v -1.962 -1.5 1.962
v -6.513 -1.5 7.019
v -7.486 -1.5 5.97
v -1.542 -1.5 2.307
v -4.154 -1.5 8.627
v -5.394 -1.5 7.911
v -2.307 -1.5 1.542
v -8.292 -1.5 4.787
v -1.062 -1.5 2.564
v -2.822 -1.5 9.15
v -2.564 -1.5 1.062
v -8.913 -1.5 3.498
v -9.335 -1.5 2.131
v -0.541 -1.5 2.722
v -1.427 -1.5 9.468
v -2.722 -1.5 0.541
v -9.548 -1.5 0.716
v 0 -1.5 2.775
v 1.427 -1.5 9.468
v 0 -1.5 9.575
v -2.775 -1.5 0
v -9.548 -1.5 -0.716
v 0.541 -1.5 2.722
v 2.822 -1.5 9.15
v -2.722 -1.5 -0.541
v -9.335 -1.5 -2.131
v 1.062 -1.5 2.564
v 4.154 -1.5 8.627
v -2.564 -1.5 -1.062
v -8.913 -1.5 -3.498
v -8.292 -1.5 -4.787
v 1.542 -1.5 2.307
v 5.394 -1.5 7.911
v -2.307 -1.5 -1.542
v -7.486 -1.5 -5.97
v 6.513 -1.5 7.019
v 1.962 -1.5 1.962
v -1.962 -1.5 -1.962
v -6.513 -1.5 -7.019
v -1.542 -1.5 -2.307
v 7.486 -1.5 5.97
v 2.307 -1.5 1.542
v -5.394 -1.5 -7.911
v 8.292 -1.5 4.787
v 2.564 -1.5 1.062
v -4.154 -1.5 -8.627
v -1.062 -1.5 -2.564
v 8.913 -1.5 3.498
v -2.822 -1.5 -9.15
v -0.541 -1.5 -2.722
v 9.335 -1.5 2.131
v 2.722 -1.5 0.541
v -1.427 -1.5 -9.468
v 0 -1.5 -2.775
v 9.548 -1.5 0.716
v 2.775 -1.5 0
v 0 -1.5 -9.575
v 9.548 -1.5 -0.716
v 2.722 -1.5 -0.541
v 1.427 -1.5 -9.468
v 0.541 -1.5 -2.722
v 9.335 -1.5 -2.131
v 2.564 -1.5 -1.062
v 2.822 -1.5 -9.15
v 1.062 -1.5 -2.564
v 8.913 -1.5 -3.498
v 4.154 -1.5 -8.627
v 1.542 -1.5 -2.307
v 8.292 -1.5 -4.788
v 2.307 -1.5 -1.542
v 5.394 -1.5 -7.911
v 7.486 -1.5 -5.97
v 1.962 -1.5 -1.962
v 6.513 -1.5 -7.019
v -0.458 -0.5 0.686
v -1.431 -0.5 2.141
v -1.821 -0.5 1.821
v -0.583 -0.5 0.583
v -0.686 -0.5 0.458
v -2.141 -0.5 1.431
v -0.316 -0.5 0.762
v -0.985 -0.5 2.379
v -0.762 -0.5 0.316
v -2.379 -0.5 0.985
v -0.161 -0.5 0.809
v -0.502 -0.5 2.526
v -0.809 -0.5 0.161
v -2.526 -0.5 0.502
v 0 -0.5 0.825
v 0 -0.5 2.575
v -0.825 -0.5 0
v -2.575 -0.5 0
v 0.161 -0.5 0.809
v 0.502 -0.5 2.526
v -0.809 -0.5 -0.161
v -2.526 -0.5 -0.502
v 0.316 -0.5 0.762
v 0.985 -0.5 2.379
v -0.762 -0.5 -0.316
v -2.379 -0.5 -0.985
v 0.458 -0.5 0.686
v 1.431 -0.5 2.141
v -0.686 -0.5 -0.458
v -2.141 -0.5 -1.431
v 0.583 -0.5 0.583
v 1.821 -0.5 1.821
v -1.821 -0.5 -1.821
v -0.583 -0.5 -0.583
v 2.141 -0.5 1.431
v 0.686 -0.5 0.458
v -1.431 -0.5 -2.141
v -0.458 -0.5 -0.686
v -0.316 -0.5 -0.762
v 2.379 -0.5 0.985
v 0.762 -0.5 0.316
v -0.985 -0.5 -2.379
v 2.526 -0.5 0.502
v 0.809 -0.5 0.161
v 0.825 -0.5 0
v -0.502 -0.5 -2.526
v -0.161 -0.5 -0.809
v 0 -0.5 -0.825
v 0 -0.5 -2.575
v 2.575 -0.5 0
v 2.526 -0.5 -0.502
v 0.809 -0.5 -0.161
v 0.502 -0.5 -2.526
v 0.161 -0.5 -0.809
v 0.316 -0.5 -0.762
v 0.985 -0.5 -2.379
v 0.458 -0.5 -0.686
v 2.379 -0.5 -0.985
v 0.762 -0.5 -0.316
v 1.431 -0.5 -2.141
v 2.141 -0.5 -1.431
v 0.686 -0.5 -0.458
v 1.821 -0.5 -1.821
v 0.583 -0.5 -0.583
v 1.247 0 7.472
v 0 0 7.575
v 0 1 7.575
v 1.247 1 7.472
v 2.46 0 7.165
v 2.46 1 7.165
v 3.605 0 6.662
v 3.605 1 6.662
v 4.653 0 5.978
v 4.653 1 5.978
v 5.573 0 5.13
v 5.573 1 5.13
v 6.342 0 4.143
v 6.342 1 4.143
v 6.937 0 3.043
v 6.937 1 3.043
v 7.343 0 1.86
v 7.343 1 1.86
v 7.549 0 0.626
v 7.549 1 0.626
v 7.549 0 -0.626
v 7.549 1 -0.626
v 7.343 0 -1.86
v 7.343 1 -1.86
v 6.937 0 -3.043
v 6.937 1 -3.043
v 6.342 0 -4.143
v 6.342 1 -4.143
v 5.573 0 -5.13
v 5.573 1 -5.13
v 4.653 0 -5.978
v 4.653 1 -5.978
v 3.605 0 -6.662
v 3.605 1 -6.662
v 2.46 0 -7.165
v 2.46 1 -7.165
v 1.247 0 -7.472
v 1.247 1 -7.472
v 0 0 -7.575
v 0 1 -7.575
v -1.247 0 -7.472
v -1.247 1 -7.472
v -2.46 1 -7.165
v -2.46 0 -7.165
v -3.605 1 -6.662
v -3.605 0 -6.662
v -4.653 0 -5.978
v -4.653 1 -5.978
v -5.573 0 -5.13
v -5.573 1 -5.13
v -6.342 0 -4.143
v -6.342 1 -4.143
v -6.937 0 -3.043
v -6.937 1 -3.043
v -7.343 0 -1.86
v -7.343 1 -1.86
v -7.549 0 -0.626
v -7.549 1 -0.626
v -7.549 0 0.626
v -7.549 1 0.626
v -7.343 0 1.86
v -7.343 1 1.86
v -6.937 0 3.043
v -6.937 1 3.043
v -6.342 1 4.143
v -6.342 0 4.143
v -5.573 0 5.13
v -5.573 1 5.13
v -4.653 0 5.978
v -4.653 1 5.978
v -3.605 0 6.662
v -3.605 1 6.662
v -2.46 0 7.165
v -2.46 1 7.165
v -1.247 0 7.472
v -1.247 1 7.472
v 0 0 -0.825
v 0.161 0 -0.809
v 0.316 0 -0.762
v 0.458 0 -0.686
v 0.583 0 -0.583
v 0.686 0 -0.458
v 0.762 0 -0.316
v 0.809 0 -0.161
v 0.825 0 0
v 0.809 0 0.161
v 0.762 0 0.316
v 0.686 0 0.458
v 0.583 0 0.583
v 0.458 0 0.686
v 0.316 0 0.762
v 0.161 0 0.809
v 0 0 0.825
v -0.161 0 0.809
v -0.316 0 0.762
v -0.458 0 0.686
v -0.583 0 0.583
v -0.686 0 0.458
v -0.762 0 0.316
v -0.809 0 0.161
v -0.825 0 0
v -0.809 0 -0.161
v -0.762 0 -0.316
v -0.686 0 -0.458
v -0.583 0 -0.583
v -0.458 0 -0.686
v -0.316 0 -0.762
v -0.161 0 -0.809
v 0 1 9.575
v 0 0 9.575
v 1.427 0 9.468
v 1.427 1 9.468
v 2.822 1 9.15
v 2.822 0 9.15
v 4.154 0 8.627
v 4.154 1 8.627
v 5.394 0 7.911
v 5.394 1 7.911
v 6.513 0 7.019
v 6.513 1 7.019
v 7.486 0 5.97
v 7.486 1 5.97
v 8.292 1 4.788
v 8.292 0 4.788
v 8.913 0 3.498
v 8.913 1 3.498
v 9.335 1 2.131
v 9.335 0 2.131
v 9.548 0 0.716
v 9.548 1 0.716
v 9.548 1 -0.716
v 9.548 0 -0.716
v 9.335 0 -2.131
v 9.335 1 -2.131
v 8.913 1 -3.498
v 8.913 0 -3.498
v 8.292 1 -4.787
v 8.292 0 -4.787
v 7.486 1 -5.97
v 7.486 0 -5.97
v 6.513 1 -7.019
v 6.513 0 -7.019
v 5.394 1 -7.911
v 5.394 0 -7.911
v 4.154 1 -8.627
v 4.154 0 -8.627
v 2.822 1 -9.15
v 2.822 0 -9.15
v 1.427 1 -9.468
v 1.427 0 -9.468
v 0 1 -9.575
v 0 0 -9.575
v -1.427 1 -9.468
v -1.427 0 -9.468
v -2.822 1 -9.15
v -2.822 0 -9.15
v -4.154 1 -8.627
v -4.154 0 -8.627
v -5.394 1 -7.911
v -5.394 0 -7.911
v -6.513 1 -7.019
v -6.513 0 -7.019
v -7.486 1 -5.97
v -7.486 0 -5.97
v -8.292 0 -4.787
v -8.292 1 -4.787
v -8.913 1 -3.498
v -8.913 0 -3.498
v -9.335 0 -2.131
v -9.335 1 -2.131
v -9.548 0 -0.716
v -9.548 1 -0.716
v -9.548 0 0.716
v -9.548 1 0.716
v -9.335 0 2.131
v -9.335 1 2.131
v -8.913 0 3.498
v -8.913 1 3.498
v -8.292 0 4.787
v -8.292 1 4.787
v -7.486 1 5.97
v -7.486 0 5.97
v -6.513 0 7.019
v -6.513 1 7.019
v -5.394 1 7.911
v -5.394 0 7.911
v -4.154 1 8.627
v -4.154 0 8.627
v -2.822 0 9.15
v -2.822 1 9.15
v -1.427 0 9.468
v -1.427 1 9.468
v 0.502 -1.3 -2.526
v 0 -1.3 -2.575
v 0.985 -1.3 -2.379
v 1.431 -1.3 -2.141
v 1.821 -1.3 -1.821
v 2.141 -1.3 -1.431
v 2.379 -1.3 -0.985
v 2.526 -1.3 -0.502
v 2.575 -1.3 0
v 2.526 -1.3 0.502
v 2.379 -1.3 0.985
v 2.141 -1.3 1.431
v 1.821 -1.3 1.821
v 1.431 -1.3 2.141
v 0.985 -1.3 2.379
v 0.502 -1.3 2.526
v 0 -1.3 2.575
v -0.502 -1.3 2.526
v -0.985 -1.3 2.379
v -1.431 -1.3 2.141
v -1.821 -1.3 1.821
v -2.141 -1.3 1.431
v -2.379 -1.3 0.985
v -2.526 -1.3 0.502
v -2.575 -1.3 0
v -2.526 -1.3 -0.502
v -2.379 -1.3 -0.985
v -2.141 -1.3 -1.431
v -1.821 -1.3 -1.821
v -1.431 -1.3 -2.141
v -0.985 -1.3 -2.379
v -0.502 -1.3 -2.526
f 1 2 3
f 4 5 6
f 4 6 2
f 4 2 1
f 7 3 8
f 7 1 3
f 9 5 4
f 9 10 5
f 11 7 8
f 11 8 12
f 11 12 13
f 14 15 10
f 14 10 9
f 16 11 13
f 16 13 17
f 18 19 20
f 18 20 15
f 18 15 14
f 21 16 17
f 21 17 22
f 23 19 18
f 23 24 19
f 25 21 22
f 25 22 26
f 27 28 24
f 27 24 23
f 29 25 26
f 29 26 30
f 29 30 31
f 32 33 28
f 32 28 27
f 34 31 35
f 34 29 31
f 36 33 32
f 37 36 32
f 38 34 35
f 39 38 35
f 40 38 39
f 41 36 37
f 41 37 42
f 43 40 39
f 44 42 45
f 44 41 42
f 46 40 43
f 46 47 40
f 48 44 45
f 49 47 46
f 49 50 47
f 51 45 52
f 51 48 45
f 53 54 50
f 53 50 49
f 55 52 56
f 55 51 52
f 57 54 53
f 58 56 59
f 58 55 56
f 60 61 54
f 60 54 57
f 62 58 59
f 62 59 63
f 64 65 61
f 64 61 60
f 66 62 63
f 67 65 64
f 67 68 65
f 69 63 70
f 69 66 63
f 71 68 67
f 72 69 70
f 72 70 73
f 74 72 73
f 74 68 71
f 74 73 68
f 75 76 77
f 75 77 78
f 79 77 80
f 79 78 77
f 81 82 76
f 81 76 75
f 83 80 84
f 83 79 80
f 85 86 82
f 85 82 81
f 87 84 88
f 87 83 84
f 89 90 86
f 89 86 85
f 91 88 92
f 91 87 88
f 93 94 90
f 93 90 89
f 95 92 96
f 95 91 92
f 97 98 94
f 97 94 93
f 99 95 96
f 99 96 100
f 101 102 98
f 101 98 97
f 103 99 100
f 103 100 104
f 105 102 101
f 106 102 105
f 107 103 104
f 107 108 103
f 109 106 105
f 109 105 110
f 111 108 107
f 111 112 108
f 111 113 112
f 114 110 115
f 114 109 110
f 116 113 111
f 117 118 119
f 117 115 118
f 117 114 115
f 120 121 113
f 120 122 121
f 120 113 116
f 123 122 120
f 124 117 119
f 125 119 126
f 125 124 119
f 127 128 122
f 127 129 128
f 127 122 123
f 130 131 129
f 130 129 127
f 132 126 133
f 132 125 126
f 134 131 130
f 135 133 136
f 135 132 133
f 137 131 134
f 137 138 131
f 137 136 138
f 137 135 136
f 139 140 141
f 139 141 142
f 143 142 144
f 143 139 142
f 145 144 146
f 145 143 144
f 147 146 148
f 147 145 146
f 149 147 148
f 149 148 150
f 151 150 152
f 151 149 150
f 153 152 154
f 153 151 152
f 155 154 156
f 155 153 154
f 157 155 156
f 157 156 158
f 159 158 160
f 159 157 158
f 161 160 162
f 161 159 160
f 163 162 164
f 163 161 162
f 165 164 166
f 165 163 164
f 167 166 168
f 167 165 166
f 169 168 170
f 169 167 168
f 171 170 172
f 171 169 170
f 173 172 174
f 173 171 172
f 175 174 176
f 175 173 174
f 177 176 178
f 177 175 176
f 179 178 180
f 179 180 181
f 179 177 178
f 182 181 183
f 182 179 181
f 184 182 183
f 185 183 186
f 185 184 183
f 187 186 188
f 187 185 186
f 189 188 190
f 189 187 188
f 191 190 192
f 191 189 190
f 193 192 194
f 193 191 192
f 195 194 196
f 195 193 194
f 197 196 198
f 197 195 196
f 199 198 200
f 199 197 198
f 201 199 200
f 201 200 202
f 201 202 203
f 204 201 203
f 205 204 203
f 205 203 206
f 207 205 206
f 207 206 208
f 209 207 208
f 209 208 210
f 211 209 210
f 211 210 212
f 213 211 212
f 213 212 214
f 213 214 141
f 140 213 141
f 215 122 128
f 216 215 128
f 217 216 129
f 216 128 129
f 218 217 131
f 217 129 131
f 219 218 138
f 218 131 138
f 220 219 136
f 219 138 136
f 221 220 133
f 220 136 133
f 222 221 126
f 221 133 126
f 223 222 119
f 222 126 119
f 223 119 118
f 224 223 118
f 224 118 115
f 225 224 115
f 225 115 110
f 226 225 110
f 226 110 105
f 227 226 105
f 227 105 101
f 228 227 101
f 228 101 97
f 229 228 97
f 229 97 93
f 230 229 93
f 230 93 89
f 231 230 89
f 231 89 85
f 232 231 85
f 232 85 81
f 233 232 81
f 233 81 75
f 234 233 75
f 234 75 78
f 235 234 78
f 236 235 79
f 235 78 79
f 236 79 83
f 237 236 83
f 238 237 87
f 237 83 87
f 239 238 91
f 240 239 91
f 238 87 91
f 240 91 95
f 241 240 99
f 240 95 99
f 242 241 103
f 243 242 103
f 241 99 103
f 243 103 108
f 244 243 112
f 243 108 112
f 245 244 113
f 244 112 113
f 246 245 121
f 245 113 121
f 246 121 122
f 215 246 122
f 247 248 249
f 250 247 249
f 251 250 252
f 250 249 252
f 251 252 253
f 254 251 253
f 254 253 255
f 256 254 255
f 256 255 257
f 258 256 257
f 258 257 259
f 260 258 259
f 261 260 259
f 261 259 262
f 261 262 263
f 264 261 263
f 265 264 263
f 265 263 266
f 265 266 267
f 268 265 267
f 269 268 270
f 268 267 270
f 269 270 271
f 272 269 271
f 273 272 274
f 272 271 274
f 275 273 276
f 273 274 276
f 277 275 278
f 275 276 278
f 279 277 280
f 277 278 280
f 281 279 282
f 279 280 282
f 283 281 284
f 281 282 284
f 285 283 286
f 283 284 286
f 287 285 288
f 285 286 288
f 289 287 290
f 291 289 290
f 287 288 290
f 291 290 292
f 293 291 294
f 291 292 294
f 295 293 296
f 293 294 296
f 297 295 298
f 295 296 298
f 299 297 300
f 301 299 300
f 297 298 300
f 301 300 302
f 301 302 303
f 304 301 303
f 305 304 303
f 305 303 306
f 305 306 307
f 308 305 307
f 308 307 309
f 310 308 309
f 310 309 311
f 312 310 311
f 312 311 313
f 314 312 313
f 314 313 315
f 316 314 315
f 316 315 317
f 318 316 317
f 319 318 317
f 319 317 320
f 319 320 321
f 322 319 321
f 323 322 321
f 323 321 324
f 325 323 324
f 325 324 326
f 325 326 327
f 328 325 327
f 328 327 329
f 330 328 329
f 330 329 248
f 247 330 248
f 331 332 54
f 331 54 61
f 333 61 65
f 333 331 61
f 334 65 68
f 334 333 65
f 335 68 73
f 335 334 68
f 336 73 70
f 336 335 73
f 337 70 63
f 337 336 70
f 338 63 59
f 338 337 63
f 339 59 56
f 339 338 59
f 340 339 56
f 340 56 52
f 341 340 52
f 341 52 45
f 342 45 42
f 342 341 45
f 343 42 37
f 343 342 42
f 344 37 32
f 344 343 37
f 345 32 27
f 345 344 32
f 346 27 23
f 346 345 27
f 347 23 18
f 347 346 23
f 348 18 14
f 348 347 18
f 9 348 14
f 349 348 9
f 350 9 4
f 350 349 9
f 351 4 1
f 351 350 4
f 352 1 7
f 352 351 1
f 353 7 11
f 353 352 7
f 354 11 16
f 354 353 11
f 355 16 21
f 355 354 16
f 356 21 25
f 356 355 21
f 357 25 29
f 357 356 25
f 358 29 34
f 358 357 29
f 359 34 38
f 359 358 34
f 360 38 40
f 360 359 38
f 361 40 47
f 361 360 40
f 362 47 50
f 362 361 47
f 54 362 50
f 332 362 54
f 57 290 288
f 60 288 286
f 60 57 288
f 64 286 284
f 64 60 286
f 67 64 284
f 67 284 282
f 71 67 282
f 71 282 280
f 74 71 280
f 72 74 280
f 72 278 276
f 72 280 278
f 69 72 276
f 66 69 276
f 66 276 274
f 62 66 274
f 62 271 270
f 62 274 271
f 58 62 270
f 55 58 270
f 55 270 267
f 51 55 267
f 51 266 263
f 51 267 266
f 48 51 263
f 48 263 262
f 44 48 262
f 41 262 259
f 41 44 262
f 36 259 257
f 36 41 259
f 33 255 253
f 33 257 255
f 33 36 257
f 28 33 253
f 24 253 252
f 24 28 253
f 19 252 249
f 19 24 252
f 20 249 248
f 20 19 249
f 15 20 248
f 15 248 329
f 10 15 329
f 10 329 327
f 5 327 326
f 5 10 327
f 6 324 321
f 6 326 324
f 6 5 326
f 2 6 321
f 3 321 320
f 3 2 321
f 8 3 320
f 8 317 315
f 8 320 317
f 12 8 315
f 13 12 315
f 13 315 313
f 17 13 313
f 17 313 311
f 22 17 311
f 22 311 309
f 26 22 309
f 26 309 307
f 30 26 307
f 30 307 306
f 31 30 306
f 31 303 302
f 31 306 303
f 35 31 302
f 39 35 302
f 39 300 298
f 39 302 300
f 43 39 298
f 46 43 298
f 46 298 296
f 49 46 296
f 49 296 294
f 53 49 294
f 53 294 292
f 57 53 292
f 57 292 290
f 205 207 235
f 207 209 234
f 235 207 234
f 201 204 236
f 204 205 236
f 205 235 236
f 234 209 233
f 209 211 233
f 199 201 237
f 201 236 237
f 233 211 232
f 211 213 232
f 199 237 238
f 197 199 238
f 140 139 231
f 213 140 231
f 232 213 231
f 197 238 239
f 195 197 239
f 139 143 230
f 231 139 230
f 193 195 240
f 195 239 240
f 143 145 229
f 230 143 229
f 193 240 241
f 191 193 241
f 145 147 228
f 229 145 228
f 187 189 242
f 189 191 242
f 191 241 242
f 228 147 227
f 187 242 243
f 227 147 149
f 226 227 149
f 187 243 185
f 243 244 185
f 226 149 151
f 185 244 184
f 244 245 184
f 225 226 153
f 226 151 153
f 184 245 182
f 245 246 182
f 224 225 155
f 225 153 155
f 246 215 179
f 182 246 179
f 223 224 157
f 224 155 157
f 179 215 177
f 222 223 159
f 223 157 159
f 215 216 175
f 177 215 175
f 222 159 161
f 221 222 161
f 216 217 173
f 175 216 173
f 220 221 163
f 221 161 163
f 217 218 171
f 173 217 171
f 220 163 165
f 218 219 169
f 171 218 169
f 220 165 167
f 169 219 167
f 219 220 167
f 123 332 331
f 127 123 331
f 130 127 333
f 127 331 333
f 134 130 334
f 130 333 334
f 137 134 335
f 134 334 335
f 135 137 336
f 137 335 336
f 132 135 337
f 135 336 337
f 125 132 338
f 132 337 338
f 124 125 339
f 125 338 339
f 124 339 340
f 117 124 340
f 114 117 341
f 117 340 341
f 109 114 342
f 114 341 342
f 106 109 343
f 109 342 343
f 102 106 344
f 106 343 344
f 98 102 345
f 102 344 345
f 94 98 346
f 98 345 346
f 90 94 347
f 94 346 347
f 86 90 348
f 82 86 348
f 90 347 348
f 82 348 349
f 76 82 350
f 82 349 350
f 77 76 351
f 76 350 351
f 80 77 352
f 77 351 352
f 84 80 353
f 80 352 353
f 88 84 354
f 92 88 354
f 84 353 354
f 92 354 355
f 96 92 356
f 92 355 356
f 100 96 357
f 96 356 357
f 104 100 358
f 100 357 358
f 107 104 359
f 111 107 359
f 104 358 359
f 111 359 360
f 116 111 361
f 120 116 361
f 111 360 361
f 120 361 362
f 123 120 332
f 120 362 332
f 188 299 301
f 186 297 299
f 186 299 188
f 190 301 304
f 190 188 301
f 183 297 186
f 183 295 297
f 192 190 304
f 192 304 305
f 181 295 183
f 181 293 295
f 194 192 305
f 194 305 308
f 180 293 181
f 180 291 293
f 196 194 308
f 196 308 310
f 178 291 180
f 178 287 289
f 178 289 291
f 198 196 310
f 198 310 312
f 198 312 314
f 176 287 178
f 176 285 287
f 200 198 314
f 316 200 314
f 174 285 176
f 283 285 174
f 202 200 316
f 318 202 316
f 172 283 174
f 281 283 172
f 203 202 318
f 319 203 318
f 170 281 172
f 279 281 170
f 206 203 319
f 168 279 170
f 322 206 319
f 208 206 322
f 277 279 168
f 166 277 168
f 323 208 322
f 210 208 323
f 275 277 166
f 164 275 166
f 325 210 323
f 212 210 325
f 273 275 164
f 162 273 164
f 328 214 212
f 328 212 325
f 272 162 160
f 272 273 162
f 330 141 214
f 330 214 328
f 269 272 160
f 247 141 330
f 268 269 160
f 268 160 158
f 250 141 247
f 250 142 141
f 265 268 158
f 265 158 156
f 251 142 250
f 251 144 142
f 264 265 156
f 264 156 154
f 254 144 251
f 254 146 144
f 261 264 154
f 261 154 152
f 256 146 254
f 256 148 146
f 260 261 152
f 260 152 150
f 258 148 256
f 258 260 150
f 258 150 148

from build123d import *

# Parameters (mm, degrees)
SKETCH1_R           = 9.575
SKETCH1_R_2         = 7.575
BOSS_EXTRUDE1_DEPTH = 1
BOSS_EXTRUDE2_START = 1.5
SKETCH2_R           = 9.575
BOSS_EXTRUDE2_DEPTH = 1.5
SKETCH3_R           = 2.575
CUT_EXTRUDE1_DEPTH  = 1
CHAMFER1_SIZE       = 0.2
SKETCH4_R           = 0.825
CUT_EXTRUDE2_DEPTH  = 14.623921976


with BuildPart() as part:
    # Sketch1 → Boss-Extrude1 (new body)
    with BuildSketch(Plane(origin=(0, 0, 0), x_dir=(1, 0, 0), z_dir=(0, 1, 0))):
        with Locations(Location((0, 0, 0), (0, 0, 270))):
            Circle(SKETCH1_R)
        with Locations(Location((0, 0, 0), (0, 0, 270))):
            Circle(SKETCH1_R_2, mode=Mode.SUBTRACT)
    extrude(amount=BOSS_EXTRUDE1_DEPTH)

    # Sketch2 → Boss-Extrude2 (add)
    with BuildSketch(Plane.XZ.offset(BOSS_EXTRUDE2_START)):
        with Locations(Location((0, 0, 0), (0, 0, 270))):
            Circle(SKETCH2_R)
    extrude(amount=-BOSS_EXTRUDE2_DEPTH)

    # Sketch3 → Cut-Extrude1 (cut)
    with BuildSketch(Plane.XZ.offset(1.5)):
        with Locations(Location((0, 0, 0), (0, 0, 270))):
            Circle(SKETCH3_R)
    extrude(amount=-CUT_EXTRUDE1_DEPTH, mode=Mode.SUBTRACT)

    # Chamfer1
    chamfer1_edges = [part.edges().sort_by_distance(p)[0] for p in [
        (0, -1.5, 2.575),
    ]]
    chamfer(chamfer1_edges, length=CHAMFER1_SIZE)

    # Sketch4 → Cut-Extrude2 (cut, through all)
    with BuildSketch(Plane.XZ.offset(0.5)):
        with Locations(Location((0, 0, 0), (0, 0, 270))):
            Circle(SKETCH4_R)
    extrude(amount=-CUT_EXTRUDE2_DEPTH, mode=Mode.SUBTRACT)


solid = part.part
